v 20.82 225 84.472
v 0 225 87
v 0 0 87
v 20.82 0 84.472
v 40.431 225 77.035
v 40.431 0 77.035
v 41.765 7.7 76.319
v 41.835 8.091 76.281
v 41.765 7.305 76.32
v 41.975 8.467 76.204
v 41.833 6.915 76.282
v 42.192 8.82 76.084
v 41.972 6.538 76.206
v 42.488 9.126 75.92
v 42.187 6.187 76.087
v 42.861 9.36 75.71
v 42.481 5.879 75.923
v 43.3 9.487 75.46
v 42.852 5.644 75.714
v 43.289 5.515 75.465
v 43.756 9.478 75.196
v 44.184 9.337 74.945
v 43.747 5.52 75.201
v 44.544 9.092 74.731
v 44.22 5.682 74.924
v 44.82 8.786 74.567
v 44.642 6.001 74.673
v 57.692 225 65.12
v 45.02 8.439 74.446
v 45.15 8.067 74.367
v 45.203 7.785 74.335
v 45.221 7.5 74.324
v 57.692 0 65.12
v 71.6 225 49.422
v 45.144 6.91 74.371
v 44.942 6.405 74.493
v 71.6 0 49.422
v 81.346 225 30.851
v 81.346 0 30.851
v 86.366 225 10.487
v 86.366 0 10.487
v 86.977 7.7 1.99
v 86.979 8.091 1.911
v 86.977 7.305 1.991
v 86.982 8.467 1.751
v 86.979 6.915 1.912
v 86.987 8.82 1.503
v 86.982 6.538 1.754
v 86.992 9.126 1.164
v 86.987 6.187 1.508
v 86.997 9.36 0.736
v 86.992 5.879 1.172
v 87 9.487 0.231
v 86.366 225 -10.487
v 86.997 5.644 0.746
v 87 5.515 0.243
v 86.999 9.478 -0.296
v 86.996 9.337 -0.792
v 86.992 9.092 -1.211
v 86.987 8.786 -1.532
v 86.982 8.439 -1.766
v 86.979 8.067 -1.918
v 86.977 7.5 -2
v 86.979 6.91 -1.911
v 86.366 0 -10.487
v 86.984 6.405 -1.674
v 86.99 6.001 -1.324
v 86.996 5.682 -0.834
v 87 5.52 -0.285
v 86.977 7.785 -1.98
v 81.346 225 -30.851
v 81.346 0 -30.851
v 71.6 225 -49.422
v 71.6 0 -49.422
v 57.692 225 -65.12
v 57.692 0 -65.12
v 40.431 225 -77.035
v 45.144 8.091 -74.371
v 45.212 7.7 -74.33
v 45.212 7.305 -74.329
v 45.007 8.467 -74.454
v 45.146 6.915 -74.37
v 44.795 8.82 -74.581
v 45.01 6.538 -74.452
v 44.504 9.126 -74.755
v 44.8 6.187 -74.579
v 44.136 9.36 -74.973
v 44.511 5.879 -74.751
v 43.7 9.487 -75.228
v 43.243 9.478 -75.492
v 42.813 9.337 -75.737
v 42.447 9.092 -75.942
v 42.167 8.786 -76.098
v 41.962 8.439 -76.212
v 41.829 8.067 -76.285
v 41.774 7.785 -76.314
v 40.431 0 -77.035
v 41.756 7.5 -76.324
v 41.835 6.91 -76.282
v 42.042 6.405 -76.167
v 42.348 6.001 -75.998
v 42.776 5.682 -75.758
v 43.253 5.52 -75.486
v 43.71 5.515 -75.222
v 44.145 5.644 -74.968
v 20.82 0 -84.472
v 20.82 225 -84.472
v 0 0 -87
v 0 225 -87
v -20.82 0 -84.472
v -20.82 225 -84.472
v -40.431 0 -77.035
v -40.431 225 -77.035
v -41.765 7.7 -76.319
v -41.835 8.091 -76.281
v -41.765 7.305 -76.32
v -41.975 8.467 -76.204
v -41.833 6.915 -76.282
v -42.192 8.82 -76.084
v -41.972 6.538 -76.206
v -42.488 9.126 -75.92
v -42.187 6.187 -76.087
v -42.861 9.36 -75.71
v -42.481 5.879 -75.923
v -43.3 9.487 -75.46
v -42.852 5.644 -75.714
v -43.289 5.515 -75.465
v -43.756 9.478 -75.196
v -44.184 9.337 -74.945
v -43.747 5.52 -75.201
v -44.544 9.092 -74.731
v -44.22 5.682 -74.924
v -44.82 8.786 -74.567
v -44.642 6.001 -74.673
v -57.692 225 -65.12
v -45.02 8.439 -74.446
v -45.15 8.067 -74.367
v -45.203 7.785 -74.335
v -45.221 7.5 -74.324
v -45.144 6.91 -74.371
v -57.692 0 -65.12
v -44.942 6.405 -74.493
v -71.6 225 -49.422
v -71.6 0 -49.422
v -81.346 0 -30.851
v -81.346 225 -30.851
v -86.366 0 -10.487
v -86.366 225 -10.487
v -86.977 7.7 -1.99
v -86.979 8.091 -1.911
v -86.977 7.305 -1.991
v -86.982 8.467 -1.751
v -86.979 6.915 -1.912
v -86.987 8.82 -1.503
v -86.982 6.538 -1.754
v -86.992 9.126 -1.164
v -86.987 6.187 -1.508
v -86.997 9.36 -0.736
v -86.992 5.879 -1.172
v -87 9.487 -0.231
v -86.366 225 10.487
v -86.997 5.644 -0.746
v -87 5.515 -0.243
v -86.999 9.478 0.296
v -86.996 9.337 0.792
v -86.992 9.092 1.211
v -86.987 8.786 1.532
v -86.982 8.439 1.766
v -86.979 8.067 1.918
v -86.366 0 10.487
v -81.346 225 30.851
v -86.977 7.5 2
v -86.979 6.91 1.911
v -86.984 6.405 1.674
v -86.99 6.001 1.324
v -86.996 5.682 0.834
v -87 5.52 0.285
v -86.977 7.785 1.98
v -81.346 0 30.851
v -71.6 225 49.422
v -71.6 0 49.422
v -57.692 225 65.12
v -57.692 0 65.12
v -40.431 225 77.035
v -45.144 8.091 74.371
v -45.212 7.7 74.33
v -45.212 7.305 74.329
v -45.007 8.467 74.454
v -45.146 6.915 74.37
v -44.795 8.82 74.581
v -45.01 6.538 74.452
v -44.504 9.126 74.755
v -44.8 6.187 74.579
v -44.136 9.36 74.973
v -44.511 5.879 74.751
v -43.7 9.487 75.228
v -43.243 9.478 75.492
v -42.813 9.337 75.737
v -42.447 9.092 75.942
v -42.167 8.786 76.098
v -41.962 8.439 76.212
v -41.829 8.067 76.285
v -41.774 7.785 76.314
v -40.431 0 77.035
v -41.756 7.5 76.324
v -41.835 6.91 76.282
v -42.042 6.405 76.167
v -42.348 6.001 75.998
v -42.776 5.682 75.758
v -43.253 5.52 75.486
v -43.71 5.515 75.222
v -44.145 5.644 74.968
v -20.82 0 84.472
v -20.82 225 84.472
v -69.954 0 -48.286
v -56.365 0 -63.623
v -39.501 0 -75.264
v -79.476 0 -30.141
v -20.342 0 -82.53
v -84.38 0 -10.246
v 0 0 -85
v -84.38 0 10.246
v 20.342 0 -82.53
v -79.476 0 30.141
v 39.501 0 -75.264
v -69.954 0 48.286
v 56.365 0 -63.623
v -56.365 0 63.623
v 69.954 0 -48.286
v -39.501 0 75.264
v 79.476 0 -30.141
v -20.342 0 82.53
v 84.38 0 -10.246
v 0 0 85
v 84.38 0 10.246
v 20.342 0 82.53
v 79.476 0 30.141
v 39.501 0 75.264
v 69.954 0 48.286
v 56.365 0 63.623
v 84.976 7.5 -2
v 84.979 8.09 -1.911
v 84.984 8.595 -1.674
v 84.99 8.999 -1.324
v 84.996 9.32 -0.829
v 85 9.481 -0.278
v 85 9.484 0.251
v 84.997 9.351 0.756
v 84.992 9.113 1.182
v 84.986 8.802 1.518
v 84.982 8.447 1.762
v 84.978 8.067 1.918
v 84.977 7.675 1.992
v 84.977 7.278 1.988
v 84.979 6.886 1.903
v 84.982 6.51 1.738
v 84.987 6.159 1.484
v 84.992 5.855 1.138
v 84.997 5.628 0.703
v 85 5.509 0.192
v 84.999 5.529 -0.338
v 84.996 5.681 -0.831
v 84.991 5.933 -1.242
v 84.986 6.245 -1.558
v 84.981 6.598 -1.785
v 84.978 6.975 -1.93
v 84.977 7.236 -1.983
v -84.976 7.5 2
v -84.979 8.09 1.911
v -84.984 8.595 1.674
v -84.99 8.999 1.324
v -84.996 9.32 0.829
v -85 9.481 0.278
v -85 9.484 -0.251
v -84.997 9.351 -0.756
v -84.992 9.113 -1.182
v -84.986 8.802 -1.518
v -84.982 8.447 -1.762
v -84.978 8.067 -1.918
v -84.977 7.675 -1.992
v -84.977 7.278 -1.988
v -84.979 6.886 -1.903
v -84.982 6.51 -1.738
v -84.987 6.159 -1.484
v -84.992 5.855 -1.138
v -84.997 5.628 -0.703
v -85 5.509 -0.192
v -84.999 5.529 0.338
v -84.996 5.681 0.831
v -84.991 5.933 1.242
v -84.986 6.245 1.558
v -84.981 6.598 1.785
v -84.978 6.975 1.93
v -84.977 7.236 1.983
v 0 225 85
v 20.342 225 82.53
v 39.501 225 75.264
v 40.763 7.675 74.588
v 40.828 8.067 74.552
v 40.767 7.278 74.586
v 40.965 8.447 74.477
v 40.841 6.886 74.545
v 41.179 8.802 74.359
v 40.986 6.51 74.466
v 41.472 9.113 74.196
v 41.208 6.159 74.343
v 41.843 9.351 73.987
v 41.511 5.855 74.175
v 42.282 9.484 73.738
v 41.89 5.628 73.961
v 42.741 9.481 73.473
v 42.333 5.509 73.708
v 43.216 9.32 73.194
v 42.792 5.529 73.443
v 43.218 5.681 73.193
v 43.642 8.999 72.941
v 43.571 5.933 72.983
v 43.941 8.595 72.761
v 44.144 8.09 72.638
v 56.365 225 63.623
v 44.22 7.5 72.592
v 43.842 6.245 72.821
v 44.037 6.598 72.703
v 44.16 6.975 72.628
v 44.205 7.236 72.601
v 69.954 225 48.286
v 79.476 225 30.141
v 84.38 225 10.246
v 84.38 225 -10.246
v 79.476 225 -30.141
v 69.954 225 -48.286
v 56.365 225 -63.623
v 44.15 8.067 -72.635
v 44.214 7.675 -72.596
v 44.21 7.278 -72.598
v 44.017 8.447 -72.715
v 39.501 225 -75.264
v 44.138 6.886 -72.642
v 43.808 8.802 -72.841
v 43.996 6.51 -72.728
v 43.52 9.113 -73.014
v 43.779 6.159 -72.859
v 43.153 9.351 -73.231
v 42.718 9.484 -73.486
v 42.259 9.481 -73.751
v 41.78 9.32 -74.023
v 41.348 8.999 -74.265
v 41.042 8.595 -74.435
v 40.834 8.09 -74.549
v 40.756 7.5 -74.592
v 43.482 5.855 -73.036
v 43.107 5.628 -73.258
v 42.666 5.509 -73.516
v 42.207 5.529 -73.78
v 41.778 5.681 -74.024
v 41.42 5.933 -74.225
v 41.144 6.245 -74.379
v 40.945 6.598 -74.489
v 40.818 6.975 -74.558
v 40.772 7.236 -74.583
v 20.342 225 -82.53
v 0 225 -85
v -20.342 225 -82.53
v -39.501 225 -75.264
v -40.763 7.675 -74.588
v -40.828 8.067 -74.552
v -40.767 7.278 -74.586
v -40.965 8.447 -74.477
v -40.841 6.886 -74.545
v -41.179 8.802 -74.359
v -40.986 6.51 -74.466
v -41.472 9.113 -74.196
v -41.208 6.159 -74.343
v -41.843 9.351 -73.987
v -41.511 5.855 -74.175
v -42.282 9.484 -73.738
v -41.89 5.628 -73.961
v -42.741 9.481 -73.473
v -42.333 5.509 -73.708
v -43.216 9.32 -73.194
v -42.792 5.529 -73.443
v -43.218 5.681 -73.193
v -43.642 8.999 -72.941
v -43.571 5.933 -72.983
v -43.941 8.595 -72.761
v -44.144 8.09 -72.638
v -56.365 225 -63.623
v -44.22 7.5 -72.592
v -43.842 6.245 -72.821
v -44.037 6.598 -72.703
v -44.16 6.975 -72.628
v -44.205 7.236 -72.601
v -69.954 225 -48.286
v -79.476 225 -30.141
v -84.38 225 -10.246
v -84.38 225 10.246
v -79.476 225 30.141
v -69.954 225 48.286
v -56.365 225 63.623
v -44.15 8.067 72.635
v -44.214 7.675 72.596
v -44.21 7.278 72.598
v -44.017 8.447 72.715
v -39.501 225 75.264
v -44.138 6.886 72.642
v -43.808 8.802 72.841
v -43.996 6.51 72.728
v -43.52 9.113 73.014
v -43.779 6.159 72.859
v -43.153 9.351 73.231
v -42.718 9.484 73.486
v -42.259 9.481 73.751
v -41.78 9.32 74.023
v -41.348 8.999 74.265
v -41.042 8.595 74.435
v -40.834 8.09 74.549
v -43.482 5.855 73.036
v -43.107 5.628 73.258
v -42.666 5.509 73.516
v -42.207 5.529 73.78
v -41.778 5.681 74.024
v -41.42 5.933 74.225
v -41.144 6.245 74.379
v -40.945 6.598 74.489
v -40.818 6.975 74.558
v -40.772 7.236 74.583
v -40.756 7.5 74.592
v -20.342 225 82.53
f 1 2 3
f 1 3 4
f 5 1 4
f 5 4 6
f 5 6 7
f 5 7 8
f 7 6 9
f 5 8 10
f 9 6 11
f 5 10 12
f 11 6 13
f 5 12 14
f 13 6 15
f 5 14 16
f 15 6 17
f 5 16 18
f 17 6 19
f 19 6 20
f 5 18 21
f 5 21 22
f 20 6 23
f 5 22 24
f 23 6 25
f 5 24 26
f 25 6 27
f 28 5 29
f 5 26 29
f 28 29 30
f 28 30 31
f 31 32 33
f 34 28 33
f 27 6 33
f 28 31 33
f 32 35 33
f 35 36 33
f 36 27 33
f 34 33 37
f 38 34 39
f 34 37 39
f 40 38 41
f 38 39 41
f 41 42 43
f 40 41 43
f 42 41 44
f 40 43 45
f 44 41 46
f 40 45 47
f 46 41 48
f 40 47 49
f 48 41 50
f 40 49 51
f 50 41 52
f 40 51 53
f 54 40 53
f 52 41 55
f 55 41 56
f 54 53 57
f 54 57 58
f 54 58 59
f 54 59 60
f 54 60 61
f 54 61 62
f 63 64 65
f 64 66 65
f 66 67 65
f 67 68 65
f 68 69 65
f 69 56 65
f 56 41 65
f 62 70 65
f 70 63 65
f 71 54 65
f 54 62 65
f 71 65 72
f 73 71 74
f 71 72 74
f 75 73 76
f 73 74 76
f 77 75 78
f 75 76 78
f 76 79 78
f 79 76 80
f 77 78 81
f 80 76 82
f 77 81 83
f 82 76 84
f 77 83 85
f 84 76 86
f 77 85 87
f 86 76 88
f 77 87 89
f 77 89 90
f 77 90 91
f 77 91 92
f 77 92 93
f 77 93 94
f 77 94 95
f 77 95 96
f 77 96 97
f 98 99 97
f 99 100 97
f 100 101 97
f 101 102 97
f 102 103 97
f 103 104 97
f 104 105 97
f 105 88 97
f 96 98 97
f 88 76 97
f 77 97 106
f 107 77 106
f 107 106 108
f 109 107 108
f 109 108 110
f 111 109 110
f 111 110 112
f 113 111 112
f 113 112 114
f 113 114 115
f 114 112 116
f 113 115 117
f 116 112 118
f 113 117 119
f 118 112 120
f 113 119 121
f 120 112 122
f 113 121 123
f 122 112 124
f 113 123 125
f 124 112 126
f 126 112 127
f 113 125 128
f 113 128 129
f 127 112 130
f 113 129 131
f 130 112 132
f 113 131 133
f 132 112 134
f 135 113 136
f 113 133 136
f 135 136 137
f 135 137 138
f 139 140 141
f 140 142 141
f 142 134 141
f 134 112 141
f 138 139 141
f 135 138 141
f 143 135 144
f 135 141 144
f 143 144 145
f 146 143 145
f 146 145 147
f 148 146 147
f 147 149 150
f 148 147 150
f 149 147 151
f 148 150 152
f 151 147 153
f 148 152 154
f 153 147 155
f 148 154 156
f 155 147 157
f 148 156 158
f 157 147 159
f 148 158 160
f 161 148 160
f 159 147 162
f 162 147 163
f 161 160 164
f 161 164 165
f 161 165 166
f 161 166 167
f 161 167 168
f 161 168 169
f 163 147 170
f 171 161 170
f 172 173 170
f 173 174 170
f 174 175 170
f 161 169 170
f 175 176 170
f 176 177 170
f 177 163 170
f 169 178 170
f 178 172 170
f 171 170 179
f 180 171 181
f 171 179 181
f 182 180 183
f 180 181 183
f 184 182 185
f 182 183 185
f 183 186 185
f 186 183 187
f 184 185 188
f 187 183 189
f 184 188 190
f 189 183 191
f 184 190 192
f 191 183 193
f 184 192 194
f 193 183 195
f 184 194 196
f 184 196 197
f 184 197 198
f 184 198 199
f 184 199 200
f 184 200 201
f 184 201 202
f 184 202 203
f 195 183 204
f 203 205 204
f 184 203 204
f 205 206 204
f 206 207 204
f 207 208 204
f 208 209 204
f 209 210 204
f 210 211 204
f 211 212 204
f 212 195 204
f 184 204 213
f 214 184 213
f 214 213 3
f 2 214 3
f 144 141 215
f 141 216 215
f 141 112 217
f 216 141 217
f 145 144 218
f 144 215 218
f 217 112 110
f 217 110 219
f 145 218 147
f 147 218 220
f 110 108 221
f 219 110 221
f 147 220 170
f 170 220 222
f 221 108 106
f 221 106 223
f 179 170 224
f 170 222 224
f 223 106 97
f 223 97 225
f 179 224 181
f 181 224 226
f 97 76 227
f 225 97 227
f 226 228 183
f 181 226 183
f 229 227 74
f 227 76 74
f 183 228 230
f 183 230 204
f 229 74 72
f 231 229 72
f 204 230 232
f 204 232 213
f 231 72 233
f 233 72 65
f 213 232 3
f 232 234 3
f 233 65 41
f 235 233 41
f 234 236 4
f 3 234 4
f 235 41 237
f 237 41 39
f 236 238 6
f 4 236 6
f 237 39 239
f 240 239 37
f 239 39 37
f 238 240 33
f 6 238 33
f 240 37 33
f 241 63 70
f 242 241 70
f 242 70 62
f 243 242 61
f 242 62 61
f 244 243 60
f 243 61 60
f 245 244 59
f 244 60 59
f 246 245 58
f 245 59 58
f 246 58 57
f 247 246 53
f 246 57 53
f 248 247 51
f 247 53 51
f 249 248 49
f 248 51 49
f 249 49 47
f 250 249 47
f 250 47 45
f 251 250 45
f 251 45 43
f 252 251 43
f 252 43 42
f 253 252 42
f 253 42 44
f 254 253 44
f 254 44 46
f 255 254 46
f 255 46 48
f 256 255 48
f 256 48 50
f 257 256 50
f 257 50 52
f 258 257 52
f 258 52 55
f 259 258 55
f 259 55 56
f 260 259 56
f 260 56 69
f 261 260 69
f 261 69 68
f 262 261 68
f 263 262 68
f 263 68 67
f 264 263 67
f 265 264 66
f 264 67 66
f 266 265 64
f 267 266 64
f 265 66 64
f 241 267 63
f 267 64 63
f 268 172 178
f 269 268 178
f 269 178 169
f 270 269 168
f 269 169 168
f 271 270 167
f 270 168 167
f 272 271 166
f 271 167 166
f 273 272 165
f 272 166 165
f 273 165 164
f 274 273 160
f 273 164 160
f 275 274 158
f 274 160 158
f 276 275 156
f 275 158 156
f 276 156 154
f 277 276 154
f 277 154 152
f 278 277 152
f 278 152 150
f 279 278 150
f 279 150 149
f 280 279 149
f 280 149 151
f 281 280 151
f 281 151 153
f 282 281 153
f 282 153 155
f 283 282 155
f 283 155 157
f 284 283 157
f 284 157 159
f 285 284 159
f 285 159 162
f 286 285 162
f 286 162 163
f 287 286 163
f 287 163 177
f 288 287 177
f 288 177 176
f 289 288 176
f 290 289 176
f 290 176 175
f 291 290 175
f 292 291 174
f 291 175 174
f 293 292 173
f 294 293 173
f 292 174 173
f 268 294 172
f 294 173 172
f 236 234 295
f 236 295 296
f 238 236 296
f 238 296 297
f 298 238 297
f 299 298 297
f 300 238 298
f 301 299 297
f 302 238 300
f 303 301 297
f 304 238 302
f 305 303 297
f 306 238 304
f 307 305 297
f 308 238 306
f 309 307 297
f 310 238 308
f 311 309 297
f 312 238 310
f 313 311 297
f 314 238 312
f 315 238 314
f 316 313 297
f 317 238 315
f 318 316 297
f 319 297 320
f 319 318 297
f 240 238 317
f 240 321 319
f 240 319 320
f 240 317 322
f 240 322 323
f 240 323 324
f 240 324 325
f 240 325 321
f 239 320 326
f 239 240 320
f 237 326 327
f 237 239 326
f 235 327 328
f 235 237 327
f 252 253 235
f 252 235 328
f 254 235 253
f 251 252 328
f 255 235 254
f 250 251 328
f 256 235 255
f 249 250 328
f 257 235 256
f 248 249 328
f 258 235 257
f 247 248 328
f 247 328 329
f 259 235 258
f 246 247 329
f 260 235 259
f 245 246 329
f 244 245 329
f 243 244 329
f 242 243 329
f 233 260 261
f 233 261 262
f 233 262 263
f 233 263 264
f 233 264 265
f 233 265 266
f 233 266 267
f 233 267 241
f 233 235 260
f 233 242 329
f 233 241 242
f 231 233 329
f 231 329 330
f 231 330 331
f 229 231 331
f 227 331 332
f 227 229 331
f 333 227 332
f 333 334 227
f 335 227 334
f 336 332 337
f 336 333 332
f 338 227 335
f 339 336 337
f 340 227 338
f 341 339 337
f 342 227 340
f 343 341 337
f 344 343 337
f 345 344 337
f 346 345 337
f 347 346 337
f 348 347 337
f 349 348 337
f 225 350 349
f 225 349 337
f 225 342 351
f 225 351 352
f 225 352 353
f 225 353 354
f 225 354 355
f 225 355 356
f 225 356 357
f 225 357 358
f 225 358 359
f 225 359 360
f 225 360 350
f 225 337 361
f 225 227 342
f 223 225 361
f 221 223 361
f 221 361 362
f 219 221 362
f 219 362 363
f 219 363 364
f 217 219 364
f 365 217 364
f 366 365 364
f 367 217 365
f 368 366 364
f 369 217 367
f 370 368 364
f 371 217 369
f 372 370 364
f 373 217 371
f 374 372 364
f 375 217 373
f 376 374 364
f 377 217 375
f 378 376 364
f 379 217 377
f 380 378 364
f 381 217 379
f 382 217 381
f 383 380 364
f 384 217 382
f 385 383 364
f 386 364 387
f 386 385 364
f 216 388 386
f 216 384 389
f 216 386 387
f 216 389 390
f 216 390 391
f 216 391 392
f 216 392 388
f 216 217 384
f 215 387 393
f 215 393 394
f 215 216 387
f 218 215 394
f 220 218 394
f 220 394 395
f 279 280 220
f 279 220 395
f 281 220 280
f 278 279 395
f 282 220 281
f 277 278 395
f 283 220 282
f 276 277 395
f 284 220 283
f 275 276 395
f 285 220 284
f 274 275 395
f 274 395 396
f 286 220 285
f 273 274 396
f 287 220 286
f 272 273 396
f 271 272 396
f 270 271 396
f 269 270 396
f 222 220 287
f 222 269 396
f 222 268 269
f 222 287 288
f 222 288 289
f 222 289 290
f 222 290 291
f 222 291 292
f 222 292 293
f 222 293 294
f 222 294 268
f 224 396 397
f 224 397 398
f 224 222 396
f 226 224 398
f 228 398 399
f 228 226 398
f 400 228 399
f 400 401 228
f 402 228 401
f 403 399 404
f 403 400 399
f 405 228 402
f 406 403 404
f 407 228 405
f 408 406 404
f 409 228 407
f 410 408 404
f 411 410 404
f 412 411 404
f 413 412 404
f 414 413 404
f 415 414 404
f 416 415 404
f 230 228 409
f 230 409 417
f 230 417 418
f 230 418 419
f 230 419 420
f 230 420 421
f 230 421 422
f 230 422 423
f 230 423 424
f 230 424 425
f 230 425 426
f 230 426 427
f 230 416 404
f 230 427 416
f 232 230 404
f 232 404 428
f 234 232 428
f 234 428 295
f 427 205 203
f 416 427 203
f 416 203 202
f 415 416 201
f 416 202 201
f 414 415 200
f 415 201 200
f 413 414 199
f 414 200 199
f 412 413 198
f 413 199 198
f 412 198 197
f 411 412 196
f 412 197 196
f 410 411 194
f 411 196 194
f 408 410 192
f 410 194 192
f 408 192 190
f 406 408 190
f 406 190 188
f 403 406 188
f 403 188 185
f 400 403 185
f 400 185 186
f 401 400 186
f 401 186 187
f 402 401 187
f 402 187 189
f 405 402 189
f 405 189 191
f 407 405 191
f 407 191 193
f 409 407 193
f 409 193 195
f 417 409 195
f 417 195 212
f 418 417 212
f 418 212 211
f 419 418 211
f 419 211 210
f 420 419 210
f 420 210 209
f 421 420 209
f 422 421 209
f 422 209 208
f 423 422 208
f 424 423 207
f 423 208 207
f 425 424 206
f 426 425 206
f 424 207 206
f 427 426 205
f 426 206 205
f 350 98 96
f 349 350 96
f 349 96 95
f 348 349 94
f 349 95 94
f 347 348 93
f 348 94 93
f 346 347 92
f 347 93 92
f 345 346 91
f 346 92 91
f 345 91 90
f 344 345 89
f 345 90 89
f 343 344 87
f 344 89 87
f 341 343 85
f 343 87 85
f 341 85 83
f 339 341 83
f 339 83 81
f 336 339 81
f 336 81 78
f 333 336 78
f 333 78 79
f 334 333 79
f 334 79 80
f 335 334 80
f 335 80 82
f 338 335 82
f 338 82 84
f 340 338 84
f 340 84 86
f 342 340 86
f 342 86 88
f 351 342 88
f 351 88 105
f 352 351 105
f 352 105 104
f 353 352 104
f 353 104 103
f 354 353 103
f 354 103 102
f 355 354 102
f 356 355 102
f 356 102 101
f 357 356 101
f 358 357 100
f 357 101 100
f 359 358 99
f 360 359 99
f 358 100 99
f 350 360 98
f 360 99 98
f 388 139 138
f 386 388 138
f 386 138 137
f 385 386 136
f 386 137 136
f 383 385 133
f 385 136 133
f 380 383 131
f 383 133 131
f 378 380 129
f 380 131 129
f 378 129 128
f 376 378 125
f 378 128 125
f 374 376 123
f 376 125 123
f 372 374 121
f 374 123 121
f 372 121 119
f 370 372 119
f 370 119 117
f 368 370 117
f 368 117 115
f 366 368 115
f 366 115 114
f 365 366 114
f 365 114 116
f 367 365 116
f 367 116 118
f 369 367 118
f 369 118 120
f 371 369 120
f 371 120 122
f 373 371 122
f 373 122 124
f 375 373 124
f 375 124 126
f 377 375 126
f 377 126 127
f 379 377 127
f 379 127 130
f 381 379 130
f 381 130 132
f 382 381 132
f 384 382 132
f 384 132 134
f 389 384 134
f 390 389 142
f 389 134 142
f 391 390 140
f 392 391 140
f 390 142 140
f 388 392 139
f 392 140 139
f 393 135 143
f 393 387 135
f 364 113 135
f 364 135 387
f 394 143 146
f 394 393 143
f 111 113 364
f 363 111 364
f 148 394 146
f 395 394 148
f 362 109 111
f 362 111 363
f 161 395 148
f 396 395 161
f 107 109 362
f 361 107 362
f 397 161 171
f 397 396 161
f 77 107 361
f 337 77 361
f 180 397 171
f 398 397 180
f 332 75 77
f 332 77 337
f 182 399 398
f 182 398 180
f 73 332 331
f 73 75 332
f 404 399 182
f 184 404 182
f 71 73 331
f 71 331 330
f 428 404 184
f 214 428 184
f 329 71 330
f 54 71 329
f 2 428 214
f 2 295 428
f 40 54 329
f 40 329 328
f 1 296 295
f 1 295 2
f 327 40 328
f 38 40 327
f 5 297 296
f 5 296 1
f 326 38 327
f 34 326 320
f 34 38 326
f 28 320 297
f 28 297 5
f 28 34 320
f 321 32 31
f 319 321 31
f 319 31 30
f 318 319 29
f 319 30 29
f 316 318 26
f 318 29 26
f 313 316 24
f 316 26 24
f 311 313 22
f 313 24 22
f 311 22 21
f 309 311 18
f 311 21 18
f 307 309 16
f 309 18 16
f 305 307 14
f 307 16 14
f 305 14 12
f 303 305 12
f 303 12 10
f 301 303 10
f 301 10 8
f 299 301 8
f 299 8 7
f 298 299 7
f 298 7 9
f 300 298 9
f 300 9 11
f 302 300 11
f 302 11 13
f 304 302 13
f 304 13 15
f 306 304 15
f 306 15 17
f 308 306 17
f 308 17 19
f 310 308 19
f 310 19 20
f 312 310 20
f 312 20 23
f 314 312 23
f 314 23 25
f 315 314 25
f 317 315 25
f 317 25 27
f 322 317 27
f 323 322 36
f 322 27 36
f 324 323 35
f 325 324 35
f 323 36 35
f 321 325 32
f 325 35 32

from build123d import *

# Parameters (mm, degrees)
SKETCH1_R               = 87
SKETCH1_R_2             = 85
BOSS_EXTRUDE1_DEPTH     = 225
CUT_EXTRUDE1_REACH      = 299.439
CUT_EXTRUDE1_END_RADIUS = 85
SKETCH2_R               = 2
CIRPATTERN1_COUNT       = 6


with BuildPart() as part:
    # Sketch1 → Boss-Extrude1 (new body)
    with BuildSketch(Plane(origin=(0, 0, 0), x_dir=(1, 0, 0), z_dir=(0, 1, 0))):
        with Locations(Location((0, 0, 0), (0, 0, 270))):
            Circle(SKETCH1_R)
        with Locations(Location((0, 0, 0), (0, 0, 270))):
            Circle(SKETCH1_R_2, mode=Mode.SUBTRACT)
    extrude(amount=BOSS_EXTRUDE1_DEPTH)

    # Cut-Extrude1: up to this cylinder (the profile starts outside it)
    cut_extrude1_end = Plane(origin=(0, 7.5, 0), z_dir=(0, -1, 0)) * Cylinder(CUT_EXTRUDE1_END_RADIUS, 769.878, mode=Mode.PRIVATE)
    # Sketch2 → Cut-Extrude1 (cut, up to the surface)
    with BuildSketch(Plane.ZY.offset(87), mode=Mode.PRIVATE) as cut_extrude1_sk1:
        with Locations((0, 7.5)):
            Circle(SKETCH2_R)
    cut_extrude1_tool1 = extrude(cut_extrude1_sk1.sketch, amount=-CUT_EXTRUDE1_REACH, mode=Mode.PRIVATE) - cut_extrude1_end
    cut_extrude1 = cut_extrude1_tool1.solids().sort_by_distance((-87, 7.5, 0))[0]
    add(cut_extrude1, mode=Mode.SUBTRACT)

    # CirPattern1: Cut-Extrude1 ×6 about axis
    cirpattern1_axis = Axis((0, 0, 0), (0, 1, 0))
    for i in range(1, CIRPATTERN1_COUNT):
        add(cut_extrude1.rotate(cirpattern1_axis, i * 360 / CIRPATTERN1_COUNT), mode=Mode.SUBTRACT)


solid = part.part
